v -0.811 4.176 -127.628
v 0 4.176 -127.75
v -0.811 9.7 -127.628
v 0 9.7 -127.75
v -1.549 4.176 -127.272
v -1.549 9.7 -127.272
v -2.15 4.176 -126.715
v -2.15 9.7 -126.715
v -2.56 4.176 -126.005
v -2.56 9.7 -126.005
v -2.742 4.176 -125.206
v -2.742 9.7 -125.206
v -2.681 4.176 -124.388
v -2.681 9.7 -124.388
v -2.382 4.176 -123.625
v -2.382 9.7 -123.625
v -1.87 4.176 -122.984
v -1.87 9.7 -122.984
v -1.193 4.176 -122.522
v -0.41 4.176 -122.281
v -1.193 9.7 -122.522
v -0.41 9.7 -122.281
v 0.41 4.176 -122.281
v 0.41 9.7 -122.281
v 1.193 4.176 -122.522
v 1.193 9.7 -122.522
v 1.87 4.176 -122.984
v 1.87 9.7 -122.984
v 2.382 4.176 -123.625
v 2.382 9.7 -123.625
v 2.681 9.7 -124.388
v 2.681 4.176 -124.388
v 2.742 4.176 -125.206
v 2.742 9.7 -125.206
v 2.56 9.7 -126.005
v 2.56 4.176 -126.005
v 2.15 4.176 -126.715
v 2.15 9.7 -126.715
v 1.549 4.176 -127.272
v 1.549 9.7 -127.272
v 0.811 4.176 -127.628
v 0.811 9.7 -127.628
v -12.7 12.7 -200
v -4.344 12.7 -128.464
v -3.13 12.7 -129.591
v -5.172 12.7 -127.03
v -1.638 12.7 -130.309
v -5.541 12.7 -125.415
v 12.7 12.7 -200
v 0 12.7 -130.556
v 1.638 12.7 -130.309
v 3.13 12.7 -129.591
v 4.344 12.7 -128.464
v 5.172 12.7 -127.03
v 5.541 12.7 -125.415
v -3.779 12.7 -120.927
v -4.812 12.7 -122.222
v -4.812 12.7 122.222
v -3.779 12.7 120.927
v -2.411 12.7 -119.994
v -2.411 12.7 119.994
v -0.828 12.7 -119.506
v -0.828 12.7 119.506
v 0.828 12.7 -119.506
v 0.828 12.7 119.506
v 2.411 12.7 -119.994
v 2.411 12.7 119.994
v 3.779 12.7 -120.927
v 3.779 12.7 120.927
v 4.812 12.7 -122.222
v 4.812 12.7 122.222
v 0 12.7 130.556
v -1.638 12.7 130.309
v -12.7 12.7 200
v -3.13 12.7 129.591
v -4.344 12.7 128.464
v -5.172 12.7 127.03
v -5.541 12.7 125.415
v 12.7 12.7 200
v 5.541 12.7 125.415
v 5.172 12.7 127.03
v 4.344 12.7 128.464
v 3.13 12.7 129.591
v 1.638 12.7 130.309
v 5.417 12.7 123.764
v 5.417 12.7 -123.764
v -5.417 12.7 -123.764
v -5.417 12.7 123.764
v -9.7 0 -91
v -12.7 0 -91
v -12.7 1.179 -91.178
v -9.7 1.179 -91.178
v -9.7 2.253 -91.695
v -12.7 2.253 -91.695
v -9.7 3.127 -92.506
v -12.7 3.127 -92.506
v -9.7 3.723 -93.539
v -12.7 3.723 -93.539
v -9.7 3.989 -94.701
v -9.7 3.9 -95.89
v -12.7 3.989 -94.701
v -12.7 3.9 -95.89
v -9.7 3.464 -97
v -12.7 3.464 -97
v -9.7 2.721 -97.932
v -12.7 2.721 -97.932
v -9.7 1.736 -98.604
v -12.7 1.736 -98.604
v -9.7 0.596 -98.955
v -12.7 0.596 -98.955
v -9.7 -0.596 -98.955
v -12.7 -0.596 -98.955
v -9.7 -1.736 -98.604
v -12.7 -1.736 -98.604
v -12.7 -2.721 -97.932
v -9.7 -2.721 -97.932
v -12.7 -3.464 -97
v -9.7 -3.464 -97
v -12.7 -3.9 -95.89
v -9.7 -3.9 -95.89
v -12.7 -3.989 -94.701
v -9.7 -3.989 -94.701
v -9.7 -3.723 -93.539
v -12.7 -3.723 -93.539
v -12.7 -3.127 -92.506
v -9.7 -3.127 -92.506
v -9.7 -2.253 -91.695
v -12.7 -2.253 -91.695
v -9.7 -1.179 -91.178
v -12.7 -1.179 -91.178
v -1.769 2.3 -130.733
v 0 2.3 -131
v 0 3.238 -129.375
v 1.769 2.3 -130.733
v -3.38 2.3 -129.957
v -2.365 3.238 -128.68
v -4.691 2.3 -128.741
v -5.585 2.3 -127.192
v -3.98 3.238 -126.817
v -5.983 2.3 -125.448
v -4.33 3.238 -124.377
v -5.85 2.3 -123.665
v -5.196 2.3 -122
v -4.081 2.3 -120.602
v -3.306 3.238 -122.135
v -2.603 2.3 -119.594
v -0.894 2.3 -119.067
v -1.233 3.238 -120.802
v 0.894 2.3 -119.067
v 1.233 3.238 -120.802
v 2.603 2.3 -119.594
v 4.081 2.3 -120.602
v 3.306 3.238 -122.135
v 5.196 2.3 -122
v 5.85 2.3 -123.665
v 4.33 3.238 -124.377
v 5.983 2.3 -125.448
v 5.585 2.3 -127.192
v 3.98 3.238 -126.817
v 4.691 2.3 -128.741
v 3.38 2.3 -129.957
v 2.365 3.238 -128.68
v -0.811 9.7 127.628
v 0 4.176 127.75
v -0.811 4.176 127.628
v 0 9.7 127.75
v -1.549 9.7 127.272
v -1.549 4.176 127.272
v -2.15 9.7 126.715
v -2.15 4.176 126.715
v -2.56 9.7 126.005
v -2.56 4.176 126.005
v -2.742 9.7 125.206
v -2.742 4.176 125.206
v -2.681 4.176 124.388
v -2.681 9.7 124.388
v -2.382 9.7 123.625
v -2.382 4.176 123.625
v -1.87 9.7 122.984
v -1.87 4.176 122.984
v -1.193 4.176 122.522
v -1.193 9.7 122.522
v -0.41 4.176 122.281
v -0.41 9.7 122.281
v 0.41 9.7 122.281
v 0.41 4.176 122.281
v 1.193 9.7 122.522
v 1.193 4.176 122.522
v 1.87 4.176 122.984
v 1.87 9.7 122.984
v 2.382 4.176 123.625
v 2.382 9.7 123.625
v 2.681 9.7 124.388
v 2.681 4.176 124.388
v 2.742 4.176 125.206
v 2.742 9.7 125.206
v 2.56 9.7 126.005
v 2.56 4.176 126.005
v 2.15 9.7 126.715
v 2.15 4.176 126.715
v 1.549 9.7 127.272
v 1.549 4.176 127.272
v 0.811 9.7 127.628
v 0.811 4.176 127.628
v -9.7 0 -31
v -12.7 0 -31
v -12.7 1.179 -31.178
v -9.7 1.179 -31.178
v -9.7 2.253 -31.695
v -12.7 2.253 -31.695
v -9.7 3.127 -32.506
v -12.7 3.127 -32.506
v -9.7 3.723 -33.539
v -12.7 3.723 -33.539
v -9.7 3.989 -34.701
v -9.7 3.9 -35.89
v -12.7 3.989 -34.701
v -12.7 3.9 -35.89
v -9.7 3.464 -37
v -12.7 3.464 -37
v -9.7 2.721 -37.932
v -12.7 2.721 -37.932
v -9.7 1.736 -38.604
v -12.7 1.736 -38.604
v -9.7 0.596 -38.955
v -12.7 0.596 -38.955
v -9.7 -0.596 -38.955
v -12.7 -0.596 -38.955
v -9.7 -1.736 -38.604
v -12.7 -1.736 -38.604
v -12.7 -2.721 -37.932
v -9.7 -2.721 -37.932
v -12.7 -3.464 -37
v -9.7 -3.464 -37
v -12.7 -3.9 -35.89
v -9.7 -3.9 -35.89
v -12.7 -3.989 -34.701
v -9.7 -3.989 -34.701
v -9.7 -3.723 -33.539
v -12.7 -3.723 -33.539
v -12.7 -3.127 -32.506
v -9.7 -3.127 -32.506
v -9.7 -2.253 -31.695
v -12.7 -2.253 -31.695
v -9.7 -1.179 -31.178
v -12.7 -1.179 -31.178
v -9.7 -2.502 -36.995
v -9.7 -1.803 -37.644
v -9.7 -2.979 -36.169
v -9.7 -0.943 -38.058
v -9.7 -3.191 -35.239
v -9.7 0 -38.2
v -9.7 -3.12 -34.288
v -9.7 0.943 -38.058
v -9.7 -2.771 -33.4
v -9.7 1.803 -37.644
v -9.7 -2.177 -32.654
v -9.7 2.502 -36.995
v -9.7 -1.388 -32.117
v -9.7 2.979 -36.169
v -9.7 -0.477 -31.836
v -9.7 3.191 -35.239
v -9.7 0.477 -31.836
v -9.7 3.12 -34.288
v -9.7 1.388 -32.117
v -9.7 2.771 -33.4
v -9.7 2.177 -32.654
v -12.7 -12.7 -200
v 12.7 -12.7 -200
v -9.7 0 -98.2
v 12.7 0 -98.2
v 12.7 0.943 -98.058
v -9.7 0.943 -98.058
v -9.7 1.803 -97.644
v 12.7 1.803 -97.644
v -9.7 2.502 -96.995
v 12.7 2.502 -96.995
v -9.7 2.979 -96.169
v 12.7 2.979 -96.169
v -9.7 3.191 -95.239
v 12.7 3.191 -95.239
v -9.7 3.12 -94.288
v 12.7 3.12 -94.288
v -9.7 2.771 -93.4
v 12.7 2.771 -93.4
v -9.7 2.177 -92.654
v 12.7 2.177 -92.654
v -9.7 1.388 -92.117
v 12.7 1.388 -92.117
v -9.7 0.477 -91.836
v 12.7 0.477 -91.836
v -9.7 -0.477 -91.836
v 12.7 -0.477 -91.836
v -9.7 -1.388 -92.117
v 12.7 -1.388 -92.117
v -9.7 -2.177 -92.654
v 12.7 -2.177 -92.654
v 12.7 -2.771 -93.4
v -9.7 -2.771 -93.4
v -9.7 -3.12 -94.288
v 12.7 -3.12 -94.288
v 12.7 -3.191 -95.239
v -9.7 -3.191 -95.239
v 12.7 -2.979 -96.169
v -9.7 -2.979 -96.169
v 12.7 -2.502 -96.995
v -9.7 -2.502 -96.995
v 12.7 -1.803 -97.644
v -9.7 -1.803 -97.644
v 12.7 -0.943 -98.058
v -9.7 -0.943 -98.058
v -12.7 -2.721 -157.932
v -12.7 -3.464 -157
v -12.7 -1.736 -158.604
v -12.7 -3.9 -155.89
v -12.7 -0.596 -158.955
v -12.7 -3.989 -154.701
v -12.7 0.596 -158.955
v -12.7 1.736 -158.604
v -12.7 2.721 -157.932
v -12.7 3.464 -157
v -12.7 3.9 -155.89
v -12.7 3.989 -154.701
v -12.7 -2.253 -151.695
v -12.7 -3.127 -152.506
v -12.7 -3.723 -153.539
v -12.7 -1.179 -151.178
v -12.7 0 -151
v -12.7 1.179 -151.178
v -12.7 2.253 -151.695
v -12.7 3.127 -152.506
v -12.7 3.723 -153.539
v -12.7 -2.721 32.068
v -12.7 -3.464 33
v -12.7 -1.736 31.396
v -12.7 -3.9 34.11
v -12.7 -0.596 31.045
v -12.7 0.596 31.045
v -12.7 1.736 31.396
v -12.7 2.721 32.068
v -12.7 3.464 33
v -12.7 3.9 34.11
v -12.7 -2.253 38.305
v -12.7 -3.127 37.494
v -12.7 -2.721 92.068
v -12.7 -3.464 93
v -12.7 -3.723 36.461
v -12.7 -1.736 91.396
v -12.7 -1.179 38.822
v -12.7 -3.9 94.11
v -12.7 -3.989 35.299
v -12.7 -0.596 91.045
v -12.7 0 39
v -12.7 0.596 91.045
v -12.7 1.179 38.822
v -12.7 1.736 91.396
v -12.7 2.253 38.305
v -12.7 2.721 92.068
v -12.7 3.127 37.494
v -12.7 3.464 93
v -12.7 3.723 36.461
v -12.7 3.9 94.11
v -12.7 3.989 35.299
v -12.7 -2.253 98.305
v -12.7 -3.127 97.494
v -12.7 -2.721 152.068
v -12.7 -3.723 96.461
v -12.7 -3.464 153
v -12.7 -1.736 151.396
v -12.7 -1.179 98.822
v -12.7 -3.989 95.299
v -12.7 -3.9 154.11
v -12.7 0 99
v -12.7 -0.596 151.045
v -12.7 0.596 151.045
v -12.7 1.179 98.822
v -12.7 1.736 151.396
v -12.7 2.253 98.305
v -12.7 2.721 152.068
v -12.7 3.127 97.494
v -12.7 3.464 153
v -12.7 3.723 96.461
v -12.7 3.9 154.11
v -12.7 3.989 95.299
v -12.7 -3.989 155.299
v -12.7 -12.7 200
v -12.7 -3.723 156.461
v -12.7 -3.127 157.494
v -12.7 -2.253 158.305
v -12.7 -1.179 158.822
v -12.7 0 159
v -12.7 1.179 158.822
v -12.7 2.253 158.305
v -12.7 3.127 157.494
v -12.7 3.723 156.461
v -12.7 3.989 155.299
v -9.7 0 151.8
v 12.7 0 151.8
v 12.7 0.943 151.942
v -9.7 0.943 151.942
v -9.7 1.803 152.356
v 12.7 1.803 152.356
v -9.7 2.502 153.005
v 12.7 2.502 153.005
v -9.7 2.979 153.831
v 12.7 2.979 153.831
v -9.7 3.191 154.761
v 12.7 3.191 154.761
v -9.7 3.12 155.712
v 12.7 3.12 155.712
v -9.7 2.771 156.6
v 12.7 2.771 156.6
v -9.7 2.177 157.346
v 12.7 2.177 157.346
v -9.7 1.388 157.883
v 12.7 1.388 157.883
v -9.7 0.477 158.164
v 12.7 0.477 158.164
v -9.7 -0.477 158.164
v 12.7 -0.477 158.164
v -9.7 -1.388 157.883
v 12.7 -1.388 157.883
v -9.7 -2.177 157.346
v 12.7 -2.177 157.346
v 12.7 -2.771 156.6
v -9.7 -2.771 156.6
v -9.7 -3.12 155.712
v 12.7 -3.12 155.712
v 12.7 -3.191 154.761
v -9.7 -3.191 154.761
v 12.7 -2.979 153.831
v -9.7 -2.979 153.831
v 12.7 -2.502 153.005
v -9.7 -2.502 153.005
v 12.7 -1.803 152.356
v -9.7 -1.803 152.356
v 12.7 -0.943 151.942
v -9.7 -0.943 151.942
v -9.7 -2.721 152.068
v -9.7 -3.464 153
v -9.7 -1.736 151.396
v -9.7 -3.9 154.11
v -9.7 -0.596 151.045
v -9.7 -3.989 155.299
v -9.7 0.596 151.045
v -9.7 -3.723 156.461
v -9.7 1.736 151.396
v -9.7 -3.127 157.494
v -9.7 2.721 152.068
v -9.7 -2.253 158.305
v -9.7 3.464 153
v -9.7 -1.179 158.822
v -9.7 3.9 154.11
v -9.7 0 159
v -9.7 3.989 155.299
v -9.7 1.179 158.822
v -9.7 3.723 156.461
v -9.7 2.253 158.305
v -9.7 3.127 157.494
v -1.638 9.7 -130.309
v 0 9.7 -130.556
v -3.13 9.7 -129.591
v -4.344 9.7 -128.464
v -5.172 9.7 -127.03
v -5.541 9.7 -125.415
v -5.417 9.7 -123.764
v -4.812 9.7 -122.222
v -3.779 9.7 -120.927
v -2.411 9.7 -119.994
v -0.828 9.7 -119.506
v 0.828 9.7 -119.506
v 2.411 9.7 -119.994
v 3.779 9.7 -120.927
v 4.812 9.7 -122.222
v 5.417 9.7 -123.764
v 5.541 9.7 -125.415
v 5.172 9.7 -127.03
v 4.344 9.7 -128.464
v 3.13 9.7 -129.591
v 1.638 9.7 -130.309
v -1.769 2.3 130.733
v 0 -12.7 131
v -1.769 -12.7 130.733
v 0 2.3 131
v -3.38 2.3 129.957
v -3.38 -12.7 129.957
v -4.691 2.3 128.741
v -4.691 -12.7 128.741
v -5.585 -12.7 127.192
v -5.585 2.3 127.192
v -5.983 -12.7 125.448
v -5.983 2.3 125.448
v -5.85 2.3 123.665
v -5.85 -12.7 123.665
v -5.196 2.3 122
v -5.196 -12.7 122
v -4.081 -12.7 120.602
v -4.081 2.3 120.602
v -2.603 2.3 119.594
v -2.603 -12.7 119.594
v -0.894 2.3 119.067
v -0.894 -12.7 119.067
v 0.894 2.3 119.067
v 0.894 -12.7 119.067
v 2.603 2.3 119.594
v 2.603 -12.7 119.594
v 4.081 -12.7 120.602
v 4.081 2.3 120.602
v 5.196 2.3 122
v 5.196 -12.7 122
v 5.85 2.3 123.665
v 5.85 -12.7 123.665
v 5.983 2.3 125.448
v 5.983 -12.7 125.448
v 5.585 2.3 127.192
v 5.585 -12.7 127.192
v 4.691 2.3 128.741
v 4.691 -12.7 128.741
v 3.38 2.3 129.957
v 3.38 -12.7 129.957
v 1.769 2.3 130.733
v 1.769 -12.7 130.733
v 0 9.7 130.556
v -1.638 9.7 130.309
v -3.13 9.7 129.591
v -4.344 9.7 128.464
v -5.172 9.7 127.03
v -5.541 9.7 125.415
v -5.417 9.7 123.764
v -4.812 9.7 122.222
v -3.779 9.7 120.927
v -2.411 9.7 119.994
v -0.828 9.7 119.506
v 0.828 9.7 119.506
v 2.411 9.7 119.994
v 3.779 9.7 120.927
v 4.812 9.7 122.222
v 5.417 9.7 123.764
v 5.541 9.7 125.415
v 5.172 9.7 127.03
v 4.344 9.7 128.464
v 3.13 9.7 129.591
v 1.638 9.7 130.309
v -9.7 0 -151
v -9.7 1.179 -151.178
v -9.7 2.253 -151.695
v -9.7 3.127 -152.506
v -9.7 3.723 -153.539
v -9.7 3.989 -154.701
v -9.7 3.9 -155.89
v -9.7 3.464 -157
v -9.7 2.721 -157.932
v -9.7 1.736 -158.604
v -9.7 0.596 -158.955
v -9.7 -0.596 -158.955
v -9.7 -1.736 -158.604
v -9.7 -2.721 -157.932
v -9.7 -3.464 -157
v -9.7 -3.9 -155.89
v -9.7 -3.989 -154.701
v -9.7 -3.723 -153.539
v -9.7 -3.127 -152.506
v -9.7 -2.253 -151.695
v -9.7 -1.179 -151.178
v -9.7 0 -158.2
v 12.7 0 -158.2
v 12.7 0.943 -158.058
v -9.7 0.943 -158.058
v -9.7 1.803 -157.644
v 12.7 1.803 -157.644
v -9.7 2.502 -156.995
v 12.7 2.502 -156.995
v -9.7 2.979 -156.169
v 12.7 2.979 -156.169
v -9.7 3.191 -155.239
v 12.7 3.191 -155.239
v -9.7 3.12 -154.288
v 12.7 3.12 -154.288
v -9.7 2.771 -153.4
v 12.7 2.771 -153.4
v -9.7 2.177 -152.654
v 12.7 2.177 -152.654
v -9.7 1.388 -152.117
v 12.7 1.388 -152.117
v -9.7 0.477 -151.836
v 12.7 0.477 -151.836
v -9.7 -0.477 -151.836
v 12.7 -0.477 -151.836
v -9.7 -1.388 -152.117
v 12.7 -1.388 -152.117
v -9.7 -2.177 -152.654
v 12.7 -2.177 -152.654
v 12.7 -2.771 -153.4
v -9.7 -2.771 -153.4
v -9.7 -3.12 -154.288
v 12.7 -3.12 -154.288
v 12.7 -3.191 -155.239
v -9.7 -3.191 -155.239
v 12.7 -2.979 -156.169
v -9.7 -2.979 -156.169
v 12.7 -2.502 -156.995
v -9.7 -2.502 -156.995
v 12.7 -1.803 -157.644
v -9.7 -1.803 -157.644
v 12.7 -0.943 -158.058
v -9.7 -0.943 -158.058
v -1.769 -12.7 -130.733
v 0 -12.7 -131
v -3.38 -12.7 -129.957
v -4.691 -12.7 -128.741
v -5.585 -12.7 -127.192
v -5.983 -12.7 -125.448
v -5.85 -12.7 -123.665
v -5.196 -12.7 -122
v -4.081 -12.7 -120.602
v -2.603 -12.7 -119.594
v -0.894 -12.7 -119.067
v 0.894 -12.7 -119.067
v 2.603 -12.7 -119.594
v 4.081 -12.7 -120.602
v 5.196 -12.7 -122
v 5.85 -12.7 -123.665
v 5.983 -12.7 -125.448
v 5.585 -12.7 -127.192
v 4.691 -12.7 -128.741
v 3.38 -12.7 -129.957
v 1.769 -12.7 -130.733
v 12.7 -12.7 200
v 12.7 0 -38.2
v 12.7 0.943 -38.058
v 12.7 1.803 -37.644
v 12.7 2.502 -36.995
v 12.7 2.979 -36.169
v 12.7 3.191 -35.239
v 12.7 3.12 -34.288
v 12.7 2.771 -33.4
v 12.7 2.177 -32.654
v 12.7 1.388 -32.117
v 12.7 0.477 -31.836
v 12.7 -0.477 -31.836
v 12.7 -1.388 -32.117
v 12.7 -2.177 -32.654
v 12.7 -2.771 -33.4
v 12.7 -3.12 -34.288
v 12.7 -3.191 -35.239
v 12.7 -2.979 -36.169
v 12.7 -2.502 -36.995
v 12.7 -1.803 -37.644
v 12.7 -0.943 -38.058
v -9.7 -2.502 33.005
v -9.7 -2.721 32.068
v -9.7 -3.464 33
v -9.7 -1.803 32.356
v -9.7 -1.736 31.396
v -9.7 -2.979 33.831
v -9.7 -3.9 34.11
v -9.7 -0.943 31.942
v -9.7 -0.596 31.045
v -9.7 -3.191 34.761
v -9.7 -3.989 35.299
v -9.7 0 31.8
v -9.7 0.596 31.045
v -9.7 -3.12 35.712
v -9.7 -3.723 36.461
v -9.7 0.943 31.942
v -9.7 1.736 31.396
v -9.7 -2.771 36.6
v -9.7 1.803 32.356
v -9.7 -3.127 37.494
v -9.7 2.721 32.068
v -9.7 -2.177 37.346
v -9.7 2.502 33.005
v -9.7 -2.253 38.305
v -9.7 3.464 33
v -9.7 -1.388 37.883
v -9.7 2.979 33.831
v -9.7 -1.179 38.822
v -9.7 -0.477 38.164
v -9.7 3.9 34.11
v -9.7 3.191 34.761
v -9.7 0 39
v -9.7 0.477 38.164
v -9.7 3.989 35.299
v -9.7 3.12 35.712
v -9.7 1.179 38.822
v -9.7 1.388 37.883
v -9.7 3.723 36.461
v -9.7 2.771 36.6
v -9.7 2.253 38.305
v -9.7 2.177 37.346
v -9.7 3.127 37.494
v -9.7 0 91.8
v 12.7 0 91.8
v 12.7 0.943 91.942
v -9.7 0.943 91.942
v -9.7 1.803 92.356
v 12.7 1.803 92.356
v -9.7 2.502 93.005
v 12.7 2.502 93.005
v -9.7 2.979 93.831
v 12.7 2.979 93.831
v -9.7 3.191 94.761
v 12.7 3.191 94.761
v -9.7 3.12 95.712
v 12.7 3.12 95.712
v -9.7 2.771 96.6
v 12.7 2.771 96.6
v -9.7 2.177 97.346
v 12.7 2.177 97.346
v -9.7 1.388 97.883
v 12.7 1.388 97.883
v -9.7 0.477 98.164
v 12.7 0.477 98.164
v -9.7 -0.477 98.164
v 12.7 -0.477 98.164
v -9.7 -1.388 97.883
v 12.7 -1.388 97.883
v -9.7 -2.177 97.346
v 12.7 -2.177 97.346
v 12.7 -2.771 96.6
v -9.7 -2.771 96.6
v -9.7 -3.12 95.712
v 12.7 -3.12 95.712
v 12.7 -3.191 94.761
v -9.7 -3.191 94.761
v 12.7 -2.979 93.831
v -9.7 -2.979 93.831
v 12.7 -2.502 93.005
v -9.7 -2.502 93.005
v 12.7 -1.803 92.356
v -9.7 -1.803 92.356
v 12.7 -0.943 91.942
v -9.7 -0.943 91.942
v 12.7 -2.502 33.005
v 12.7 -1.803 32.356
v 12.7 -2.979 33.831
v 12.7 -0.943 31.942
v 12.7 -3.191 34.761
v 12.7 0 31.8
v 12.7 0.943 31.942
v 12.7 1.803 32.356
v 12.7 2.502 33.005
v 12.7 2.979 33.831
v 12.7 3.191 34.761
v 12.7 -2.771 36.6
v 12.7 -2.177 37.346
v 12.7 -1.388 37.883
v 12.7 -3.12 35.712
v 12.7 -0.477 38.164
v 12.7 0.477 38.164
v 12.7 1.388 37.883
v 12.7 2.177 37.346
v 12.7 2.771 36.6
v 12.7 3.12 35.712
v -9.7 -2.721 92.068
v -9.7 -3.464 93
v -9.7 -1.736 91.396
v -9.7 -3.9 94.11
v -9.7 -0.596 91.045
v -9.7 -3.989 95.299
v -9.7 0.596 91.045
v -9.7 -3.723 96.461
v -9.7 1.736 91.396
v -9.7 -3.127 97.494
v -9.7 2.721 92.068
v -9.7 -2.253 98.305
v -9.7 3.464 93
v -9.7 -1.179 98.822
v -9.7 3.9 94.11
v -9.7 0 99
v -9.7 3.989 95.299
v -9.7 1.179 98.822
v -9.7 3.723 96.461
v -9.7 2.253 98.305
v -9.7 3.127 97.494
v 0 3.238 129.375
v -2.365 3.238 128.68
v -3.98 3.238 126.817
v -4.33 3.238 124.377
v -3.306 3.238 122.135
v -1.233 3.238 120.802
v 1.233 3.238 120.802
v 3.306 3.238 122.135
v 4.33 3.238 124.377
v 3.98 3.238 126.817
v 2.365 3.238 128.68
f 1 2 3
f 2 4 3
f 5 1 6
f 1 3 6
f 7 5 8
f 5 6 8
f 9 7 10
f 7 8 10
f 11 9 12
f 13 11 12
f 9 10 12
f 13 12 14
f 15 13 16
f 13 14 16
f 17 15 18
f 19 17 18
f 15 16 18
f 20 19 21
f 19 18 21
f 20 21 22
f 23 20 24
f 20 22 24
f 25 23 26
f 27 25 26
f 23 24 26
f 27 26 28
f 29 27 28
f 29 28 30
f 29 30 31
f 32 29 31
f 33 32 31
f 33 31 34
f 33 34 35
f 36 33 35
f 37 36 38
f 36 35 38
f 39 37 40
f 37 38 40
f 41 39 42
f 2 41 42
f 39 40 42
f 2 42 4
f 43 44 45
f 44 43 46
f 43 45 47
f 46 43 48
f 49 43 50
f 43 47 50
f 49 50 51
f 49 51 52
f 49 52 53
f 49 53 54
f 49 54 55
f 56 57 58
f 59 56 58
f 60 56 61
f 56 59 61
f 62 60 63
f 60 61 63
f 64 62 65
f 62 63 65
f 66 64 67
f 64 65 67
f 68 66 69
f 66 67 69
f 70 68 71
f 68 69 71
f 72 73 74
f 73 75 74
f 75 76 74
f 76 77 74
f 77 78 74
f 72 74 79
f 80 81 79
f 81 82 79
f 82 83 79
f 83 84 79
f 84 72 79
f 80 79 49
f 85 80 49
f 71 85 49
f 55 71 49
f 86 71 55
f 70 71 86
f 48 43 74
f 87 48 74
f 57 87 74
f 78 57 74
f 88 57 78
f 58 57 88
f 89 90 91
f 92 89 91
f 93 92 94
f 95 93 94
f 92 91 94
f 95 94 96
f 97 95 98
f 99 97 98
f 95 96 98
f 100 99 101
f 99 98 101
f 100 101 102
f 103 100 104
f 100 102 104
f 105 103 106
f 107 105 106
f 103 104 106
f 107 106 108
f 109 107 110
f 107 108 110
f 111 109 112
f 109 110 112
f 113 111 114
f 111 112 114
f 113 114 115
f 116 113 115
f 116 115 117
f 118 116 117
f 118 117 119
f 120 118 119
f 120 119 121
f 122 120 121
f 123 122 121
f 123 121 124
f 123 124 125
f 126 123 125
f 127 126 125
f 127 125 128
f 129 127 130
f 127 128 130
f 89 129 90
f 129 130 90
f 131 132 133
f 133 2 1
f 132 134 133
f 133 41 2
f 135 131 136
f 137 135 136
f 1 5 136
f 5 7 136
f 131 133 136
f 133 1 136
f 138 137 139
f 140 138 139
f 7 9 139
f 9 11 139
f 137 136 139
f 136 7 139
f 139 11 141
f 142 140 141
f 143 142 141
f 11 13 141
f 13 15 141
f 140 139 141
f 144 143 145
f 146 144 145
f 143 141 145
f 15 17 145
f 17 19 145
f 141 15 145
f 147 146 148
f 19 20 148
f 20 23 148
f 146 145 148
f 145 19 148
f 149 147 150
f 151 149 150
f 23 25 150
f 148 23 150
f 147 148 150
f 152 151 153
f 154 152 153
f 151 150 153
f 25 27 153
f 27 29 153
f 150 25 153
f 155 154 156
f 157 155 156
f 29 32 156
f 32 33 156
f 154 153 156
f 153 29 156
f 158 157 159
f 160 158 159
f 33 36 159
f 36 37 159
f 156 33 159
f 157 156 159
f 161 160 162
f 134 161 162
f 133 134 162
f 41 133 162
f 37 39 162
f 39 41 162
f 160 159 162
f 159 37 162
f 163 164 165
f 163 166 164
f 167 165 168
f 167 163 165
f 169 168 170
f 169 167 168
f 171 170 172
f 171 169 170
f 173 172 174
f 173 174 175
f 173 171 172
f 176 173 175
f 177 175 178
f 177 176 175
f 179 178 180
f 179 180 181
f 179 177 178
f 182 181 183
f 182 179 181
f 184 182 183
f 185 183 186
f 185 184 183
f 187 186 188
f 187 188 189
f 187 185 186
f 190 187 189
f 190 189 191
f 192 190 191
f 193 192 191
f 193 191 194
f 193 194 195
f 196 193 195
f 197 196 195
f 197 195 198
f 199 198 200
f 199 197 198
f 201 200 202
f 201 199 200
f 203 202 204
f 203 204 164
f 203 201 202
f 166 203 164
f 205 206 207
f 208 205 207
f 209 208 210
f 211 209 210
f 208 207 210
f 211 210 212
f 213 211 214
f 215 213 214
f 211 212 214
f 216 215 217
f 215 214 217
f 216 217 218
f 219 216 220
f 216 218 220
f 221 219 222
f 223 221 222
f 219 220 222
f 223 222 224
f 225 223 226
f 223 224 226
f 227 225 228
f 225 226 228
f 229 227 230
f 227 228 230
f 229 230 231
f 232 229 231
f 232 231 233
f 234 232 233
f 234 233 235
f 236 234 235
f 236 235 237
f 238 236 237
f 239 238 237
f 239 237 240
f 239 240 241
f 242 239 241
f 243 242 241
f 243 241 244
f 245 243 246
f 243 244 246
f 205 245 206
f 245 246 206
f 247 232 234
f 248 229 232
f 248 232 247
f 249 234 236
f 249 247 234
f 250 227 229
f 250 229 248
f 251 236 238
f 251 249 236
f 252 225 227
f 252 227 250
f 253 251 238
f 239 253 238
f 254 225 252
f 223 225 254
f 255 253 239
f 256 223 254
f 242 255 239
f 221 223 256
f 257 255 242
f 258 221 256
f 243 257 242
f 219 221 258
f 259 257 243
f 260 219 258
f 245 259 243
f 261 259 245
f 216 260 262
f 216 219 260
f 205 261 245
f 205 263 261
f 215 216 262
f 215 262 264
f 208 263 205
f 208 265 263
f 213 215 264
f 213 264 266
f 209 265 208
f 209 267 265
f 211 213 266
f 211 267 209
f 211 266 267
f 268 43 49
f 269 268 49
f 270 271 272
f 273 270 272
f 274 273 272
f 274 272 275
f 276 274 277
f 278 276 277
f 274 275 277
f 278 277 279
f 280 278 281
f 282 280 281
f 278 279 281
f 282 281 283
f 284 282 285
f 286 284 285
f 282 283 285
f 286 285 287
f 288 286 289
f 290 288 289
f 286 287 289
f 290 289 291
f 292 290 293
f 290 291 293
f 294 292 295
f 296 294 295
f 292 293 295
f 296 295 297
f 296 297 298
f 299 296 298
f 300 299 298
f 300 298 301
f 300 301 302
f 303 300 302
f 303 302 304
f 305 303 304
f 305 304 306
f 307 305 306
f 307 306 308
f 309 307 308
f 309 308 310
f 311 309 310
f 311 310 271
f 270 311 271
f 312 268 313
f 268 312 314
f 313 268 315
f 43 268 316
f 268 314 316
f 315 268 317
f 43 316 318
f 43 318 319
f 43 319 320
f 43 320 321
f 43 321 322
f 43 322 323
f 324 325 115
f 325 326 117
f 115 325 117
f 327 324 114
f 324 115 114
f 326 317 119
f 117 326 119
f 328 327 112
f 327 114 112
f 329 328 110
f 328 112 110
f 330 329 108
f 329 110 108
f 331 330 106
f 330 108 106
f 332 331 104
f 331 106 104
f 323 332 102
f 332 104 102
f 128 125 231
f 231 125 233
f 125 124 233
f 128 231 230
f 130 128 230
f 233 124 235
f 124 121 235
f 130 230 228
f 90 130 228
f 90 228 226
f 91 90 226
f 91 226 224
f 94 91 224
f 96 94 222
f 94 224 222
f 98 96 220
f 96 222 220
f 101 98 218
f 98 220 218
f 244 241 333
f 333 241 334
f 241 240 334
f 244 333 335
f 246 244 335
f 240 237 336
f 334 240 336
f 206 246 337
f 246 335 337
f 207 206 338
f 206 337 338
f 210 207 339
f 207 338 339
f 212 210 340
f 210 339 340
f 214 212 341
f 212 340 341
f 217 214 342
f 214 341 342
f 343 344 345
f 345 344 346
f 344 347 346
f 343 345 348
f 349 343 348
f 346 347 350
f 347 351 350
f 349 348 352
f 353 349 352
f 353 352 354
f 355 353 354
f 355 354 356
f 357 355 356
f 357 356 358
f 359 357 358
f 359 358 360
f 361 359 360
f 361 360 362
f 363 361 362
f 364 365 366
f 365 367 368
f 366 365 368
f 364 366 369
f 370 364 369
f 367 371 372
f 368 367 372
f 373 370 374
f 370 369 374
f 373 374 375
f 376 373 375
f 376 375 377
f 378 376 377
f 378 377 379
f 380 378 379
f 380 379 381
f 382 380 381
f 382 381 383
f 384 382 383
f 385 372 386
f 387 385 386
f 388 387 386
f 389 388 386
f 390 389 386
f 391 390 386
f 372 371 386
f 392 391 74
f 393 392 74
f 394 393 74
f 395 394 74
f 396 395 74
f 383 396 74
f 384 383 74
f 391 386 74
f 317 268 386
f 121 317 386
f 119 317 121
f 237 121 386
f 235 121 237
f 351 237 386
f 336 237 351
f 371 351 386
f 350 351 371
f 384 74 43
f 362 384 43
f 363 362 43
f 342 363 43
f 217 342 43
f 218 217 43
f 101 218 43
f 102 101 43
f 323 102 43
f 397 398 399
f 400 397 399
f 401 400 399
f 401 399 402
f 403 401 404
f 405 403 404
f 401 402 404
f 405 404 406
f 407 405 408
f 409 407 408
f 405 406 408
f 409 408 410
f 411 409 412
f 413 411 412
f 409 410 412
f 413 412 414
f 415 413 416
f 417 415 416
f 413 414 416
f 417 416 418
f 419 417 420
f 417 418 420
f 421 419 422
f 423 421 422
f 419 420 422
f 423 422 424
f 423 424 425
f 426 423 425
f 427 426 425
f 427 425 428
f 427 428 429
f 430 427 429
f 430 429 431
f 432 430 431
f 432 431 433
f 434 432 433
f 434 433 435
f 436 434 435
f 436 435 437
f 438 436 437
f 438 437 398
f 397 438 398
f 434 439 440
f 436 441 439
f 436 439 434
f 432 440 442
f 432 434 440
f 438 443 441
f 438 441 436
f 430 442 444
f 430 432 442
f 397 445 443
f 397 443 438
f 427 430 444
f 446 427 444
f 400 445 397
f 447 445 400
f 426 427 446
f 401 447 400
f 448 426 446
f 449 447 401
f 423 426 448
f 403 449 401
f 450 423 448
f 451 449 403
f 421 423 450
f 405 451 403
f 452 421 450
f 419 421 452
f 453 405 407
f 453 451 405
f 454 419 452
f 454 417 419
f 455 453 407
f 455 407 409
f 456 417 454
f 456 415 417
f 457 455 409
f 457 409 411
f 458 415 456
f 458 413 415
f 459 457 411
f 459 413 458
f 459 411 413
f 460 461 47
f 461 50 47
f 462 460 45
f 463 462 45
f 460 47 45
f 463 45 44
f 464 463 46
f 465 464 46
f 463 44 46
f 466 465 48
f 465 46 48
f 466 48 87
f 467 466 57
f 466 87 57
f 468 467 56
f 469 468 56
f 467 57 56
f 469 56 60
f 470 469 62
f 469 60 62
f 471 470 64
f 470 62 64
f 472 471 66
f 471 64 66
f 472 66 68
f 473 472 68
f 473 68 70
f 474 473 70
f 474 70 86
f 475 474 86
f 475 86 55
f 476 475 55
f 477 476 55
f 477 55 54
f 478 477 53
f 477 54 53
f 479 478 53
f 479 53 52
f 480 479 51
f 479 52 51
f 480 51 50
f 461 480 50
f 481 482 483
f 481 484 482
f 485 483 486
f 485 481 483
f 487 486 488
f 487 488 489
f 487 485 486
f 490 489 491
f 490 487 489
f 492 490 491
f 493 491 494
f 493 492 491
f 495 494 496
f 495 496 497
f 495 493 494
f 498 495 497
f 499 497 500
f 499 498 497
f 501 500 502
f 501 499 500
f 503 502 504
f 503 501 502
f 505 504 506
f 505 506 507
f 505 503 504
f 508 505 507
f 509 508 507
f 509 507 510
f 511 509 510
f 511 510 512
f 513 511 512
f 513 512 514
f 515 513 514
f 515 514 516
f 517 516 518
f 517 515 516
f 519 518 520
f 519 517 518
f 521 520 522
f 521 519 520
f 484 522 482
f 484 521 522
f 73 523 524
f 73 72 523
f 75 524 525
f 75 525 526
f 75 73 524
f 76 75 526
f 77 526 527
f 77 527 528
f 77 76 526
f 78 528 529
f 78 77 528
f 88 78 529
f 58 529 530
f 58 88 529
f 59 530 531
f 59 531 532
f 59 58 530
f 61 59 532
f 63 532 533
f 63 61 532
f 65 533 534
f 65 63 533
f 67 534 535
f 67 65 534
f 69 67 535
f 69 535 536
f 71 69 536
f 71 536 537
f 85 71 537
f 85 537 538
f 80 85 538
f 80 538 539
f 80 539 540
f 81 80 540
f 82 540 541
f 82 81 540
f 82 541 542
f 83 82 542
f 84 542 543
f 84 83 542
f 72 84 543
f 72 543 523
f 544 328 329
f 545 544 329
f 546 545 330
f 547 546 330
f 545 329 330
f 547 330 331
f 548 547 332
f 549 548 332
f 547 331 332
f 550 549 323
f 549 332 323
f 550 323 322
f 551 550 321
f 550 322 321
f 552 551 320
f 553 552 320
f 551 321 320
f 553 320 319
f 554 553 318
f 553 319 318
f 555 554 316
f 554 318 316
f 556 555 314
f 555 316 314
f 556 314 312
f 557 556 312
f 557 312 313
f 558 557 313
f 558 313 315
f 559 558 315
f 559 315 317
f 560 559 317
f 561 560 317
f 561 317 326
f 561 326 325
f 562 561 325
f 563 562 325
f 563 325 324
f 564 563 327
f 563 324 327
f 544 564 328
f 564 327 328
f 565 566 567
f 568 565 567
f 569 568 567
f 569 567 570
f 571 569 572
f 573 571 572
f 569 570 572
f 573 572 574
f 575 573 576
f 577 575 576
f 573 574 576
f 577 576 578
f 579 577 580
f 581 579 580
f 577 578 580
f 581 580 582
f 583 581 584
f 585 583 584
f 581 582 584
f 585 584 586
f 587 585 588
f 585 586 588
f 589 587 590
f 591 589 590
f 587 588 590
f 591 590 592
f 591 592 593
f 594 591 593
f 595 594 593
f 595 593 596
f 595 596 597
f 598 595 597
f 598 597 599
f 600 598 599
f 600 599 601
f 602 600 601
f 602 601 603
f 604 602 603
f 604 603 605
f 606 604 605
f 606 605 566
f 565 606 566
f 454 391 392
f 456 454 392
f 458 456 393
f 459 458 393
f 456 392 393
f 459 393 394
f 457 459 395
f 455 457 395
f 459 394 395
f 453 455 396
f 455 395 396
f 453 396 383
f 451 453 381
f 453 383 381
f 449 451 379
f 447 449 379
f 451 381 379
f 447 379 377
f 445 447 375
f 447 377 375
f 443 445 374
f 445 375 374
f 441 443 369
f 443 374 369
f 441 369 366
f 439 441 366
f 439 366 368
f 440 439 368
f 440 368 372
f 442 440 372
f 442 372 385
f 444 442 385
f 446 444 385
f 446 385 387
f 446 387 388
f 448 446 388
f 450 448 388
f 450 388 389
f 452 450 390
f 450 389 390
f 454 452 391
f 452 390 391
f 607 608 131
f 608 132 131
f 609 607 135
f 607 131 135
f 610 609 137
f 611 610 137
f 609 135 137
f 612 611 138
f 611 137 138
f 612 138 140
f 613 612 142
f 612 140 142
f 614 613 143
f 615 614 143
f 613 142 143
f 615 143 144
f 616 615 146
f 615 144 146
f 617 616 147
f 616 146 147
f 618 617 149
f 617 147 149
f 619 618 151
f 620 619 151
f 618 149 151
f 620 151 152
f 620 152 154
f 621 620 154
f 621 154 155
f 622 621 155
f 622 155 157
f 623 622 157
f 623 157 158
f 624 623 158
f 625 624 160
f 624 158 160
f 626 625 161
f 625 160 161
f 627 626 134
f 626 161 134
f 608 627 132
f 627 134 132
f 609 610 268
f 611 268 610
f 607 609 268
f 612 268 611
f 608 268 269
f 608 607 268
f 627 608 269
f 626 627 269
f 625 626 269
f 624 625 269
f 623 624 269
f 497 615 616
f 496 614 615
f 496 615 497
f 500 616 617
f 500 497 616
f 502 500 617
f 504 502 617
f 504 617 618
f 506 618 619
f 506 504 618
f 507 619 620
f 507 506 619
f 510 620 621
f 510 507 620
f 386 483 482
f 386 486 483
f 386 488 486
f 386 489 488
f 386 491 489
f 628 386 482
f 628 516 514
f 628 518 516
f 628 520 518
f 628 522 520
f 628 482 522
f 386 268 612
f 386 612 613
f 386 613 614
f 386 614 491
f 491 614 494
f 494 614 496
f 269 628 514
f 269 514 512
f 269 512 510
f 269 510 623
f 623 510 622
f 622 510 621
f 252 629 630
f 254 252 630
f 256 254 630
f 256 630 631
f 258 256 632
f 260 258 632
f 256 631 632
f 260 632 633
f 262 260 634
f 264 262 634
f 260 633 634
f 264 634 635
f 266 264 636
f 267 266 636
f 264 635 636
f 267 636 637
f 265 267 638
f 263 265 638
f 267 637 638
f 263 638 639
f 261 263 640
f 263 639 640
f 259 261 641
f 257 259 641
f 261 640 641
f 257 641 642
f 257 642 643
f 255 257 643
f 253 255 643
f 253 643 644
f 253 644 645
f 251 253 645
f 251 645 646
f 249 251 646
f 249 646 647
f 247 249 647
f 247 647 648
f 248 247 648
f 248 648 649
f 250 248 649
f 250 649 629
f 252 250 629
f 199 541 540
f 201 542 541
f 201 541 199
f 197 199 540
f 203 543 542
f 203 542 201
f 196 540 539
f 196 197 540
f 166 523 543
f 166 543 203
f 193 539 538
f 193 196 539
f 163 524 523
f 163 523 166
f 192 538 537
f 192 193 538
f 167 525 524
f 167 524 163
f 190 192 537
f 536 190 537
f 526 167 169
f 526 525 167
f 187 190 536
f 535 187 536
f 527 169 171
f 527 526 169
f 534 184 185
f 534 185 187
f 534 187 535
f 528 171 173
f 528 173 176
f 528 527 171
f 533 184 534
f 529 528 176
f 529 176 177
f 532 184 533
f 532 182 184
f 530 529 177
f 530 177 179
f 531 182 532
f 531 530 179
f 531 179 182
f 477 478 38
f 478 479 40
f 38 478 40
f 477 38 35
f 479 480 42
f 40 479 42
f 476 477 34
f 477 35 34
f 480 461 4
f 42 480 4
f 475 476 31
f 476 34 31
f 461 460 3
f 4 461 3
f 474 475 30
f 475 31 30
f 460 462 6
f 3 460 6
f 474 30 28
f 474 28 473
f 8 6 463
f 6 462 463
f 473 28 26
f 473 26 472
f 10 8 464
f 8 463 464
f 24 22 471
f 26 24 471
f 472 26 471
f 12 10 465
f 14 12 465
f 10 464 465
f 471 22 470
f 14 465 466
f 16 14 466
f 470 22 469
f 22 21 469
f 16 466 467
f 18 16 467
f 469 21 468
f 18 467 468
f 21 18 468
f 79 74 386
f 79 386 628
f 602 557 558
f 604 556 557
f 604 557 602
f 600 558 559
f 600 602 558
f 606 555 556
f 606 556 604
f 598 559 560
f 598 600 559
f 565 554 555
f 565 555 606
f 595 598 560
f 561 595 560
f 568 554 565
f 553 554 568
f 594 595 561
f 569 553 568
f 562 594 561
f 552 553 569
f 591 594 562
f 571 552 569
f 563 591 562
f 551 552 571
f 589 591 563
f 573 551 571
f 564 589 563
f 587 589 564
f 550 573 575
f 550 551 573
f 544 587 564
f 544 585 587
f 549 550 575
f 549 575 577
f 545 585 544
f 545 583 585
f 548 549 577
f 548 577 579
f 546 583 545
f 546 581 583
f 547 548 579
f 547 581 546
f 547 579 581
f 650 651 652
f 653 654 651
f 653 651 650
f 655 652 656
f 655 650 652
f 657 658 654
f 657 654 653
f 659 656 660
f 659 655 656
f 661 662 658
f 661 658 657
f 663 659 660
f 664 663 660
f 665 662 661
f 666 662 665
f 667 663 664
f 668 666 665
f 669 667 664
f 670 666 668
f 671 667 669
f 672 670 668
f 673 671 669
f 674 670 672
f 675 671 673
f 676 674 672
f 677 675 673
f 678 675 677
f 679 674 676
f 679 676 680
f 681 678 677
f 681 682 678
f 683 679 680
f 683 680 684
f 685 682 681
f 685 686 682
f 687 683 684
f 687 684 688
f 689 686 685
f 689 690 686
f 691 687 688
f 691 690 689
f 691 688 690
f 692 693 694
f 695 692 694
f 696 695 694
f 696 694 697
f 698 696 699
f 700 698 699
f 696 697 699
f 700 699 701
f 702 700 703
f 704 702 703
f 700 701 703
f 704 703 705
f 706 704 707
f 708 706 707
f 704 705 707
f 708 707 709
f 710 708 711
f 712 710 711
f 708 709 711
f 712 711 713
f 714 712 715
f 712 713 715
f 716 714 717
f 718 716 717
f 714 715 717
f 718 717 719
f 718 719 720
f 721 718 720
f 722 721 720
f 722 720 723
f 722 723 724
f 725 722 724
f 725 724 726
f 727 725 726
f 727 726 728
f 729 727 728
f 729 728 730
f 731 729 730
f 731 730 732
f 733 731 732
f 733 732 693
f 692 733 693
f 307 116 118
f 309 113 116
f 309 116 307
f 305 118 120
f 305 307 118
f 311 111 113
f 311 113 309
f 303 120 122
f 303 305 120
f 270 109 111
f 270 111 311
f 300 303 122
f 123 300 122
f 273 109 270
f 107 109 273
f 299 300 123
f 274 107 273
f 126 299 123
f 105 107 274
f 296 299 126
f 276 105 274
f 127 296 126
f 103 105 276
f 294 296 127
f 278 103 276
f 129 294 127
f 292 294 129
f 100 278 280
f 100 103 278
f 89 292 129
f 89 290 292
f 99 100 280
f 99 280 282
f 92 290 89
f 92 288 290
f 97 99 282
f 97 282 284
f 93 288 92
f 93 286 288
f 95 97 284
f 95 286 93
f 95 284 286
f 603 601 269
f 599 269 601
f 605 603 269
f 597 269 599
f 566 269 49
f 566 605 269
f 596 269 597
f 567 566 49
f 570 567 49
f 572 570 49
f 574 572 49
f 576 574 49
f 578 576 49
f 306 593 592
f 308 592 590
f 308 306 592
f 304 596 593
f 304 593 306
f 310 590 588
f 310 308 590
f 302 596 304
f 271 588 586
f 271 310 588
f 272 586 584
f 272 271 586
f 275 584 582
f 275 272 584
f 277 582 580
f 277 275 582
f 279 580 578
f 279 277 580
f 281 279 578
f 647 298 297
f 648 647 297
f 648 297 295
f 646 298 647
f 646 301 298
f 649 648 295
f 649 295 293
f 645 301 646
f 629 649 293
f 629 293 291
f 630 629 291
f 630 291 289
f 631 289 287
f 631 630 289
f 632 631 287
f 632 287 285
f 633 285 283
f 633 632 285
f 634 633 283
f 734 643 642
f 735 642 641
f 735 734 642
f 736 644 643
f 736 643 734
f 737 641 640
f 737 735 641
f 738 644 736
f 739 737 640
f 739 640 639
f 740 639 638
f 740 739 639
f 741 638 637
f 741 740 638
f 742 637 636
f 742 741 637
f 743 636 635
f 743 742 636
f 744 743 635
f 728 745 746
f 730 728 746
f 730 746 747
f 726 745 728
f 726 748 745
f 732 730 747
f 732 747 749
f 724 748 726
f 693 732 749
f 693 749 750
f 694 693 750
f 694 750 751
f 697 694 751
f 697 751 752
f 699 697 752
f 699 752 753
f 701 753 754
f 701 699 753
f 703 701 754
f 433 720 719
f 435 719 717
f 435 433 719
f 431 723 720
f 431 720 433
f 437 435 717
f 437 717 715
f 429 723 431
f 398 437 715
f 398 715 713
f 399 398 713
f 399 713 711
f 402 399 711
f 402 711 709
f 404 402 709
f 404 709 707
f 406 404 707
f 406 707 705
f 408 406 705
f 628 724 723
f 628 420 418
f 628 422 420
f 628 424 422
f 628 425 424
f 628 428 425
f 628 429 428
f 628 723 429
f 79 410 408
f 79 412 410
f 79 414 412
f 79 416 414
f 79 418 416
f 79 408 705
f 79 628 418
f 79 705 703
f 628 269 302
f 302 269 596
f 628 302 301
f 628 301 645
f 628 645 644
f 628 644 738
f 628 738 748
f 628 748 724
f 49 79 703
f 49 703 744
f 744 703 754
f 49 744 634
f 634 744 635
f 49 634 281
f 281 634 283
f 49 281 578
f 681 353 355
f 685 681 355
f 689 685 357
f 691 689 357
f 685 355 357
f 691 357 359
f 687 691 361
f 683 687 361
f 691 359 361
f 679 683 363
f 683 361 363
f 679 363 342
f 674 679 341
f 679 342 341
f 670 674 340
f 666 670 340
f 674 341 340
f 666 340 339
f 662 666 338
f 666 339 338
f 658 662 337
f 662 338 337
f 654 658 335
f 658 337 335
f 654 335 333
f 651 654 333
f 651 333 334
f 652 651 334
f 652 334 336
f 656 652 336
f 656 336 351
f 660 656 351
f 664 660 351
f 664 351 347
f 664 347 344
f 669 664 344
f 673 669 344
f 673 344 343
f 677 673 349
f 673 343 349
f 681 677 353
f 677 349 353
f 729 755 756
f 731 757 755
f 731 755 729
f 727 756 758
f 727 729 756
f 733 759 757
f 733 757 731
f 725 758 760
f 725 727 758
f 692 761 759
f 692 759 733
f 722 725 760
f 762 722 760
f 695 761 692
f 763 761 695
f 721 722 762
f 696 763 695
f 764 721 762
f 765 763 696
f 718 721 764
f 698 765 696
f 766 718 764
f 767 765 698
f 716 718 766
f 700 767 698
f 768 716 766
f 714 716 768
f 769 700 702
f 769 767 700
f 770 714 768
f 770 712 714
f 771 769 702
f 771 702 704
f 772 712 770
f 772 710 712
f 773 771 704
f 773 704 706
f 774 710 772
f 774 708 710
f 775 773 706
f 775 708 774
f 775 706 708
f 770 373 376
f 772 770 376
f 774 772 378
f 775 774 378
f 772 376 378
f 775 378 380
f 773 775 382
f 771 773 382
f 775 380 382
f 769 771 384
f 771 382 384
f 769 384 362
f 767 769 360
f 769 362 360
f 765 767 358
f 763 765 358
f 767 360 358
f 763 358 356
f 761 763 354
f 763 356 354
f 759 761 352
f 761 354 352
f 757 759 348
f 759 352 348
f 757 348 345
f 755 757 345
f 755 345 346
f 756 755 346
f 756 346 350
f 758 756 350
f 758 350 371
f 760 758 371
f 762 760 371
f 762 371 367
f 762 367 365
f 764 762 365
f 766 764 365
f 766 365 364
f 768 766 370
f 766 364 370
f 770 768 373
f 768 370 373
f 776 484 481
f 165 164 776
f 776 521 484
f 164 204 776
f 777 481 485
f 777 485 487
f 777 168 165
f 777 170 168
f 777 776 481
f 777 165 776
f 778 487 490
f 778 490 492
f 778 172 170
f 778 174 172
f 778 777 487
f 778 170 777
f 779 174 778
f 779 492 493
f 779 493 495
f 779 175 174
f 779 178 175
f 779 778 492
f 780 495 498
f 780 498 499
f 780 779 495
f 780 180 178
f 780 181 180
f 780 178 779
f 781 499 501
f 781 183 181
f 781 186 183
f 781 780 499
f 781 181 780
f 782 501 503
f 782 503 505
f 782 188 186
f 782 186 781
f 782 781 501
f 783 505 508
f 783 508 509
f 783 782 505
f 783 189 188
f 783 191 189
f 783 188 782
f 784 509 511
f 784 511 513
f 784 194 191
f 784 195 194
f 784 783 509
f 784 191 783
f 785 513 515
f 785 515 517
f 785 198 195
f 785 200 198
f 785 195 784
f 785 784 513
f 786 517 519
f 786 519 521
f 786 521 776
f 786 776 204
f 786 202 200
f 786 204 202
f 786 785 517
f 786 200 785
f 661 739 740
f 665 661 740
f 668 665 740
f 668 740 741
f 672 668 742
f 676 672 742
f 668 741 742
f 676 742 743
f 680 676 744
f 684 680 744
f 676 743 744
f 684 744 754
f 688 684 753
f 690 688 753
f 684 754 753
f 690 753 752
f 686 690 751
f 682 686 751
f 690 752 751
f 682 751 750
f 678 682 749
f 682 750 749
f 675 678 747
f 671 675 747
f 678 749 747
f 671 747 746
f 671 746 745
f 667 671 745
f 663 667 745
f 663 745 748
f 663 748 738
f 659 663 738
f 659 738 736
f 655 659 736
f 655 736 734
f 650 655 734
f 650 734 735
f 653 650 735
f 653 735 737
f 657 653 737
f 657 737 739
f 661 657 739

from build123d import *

# Parameters (mm, degrees)
BOSS_EXTRUDE1_DEPTH      = 200
BOSS_EXTRUDE1_DEPTH_BACK = 200
SKETCH1_W                = 25.4
SKETCH1_H                = 25.4
SKETCH5_R                = 3.2
CUT_EXTRUDE1_DEPTH       = 203.006064265
SKETCH6_R                = 4
CUT_EXTRUDE2_DEPTH       = 3


with BuildPart() as part:
    # Sketch1 → Boss-Extrude1 (new, two sides: drawn at the far end of the back side and taken through both)
    with BuildSketch(Plane.XY.offset(-BOSS_EXTRUDE1_DEPTH_BACK)):
        Rectangle(SKETCH1_W, SKETCH1_H)
    extrude(amount=BOSS_EXTRUDE1_DEPTH + BOSS_EXTRUDE1_DEPTH_BACK)

    # Sketch4 → Cut-Revolve1 (revolve, cut)
    with BuildSketch(Plane(origin=(0, 0, 0), x_dir=(0, 0, -1), z_dir=(1, 0, 0))):
        Polygon((-125, -12.7), (-131, -12.7), (-131, 2.3), (-127.75, 4.176388375), (-127.75, 9.7), (-130.55625, 9.7), (-130.55625, 12.7), (-125, 12.7), align=None)
    cut_revolve1 = revolve(axis=Axis((0, 23.510725719, 125), (0, -1, 0)), mode=Mode.SUBTRACT)

    # Mirror1: Cut-Revolve1 across plane
    add(cut_revolve1.mirror(Plane.XY), mode=Mode.SUBTRACT)

    # Sketch5 → Cut-Extrude1 (cut, through all)
    with BuildSketch(Plane(origin=(12.7, 0, 0), x_dir=(0, 0, -1), z_dir=(1, 0, 0))):
        with Locations((-155, 0)):
            Circle(SKETCH5_R)
        with Locations((-95, 0)):
            Circle(SKETCH5_R)
        with Locations((-35, 0)):
            Circle(SKETCH5_R)
        with Locations((35, 0)):
            Circle(SKETCH5_R)
        with Locations((95, 0)):
            Circle(SKETCH5_R)
        with Locations((155, 0)):
            Circle(SKETCH5_R)
    extrude(amount=-CUT_EXTRUDE1_DEPTH, mode=Mode.SUBTRACT)

    # Sketch6 → Cut-Extrude2 (cut)
    with BuildSketch(Plane.ZY.offset(12.7)):
        with Locations((-155, 0)):
            Circle(SKETCH6_R)
        with Locations((-95, 0)):
            Circle(SKETCH6_R)
        with Locations((-35, 0)):
            Circle(SKETCH6_R)
        with Locations((35, 0)):
            Circle(SKETCH6_R)
        with Locations((95, 0)):
            Circle(SKETCH6_R)
        with Locations((155, 0)):
            Circle(SKETCH6_R)
    extrude(amount=-CUT_EXTRUDE2_DEPTH, mode=Mode.SUBTRACT)


solid = part.part
